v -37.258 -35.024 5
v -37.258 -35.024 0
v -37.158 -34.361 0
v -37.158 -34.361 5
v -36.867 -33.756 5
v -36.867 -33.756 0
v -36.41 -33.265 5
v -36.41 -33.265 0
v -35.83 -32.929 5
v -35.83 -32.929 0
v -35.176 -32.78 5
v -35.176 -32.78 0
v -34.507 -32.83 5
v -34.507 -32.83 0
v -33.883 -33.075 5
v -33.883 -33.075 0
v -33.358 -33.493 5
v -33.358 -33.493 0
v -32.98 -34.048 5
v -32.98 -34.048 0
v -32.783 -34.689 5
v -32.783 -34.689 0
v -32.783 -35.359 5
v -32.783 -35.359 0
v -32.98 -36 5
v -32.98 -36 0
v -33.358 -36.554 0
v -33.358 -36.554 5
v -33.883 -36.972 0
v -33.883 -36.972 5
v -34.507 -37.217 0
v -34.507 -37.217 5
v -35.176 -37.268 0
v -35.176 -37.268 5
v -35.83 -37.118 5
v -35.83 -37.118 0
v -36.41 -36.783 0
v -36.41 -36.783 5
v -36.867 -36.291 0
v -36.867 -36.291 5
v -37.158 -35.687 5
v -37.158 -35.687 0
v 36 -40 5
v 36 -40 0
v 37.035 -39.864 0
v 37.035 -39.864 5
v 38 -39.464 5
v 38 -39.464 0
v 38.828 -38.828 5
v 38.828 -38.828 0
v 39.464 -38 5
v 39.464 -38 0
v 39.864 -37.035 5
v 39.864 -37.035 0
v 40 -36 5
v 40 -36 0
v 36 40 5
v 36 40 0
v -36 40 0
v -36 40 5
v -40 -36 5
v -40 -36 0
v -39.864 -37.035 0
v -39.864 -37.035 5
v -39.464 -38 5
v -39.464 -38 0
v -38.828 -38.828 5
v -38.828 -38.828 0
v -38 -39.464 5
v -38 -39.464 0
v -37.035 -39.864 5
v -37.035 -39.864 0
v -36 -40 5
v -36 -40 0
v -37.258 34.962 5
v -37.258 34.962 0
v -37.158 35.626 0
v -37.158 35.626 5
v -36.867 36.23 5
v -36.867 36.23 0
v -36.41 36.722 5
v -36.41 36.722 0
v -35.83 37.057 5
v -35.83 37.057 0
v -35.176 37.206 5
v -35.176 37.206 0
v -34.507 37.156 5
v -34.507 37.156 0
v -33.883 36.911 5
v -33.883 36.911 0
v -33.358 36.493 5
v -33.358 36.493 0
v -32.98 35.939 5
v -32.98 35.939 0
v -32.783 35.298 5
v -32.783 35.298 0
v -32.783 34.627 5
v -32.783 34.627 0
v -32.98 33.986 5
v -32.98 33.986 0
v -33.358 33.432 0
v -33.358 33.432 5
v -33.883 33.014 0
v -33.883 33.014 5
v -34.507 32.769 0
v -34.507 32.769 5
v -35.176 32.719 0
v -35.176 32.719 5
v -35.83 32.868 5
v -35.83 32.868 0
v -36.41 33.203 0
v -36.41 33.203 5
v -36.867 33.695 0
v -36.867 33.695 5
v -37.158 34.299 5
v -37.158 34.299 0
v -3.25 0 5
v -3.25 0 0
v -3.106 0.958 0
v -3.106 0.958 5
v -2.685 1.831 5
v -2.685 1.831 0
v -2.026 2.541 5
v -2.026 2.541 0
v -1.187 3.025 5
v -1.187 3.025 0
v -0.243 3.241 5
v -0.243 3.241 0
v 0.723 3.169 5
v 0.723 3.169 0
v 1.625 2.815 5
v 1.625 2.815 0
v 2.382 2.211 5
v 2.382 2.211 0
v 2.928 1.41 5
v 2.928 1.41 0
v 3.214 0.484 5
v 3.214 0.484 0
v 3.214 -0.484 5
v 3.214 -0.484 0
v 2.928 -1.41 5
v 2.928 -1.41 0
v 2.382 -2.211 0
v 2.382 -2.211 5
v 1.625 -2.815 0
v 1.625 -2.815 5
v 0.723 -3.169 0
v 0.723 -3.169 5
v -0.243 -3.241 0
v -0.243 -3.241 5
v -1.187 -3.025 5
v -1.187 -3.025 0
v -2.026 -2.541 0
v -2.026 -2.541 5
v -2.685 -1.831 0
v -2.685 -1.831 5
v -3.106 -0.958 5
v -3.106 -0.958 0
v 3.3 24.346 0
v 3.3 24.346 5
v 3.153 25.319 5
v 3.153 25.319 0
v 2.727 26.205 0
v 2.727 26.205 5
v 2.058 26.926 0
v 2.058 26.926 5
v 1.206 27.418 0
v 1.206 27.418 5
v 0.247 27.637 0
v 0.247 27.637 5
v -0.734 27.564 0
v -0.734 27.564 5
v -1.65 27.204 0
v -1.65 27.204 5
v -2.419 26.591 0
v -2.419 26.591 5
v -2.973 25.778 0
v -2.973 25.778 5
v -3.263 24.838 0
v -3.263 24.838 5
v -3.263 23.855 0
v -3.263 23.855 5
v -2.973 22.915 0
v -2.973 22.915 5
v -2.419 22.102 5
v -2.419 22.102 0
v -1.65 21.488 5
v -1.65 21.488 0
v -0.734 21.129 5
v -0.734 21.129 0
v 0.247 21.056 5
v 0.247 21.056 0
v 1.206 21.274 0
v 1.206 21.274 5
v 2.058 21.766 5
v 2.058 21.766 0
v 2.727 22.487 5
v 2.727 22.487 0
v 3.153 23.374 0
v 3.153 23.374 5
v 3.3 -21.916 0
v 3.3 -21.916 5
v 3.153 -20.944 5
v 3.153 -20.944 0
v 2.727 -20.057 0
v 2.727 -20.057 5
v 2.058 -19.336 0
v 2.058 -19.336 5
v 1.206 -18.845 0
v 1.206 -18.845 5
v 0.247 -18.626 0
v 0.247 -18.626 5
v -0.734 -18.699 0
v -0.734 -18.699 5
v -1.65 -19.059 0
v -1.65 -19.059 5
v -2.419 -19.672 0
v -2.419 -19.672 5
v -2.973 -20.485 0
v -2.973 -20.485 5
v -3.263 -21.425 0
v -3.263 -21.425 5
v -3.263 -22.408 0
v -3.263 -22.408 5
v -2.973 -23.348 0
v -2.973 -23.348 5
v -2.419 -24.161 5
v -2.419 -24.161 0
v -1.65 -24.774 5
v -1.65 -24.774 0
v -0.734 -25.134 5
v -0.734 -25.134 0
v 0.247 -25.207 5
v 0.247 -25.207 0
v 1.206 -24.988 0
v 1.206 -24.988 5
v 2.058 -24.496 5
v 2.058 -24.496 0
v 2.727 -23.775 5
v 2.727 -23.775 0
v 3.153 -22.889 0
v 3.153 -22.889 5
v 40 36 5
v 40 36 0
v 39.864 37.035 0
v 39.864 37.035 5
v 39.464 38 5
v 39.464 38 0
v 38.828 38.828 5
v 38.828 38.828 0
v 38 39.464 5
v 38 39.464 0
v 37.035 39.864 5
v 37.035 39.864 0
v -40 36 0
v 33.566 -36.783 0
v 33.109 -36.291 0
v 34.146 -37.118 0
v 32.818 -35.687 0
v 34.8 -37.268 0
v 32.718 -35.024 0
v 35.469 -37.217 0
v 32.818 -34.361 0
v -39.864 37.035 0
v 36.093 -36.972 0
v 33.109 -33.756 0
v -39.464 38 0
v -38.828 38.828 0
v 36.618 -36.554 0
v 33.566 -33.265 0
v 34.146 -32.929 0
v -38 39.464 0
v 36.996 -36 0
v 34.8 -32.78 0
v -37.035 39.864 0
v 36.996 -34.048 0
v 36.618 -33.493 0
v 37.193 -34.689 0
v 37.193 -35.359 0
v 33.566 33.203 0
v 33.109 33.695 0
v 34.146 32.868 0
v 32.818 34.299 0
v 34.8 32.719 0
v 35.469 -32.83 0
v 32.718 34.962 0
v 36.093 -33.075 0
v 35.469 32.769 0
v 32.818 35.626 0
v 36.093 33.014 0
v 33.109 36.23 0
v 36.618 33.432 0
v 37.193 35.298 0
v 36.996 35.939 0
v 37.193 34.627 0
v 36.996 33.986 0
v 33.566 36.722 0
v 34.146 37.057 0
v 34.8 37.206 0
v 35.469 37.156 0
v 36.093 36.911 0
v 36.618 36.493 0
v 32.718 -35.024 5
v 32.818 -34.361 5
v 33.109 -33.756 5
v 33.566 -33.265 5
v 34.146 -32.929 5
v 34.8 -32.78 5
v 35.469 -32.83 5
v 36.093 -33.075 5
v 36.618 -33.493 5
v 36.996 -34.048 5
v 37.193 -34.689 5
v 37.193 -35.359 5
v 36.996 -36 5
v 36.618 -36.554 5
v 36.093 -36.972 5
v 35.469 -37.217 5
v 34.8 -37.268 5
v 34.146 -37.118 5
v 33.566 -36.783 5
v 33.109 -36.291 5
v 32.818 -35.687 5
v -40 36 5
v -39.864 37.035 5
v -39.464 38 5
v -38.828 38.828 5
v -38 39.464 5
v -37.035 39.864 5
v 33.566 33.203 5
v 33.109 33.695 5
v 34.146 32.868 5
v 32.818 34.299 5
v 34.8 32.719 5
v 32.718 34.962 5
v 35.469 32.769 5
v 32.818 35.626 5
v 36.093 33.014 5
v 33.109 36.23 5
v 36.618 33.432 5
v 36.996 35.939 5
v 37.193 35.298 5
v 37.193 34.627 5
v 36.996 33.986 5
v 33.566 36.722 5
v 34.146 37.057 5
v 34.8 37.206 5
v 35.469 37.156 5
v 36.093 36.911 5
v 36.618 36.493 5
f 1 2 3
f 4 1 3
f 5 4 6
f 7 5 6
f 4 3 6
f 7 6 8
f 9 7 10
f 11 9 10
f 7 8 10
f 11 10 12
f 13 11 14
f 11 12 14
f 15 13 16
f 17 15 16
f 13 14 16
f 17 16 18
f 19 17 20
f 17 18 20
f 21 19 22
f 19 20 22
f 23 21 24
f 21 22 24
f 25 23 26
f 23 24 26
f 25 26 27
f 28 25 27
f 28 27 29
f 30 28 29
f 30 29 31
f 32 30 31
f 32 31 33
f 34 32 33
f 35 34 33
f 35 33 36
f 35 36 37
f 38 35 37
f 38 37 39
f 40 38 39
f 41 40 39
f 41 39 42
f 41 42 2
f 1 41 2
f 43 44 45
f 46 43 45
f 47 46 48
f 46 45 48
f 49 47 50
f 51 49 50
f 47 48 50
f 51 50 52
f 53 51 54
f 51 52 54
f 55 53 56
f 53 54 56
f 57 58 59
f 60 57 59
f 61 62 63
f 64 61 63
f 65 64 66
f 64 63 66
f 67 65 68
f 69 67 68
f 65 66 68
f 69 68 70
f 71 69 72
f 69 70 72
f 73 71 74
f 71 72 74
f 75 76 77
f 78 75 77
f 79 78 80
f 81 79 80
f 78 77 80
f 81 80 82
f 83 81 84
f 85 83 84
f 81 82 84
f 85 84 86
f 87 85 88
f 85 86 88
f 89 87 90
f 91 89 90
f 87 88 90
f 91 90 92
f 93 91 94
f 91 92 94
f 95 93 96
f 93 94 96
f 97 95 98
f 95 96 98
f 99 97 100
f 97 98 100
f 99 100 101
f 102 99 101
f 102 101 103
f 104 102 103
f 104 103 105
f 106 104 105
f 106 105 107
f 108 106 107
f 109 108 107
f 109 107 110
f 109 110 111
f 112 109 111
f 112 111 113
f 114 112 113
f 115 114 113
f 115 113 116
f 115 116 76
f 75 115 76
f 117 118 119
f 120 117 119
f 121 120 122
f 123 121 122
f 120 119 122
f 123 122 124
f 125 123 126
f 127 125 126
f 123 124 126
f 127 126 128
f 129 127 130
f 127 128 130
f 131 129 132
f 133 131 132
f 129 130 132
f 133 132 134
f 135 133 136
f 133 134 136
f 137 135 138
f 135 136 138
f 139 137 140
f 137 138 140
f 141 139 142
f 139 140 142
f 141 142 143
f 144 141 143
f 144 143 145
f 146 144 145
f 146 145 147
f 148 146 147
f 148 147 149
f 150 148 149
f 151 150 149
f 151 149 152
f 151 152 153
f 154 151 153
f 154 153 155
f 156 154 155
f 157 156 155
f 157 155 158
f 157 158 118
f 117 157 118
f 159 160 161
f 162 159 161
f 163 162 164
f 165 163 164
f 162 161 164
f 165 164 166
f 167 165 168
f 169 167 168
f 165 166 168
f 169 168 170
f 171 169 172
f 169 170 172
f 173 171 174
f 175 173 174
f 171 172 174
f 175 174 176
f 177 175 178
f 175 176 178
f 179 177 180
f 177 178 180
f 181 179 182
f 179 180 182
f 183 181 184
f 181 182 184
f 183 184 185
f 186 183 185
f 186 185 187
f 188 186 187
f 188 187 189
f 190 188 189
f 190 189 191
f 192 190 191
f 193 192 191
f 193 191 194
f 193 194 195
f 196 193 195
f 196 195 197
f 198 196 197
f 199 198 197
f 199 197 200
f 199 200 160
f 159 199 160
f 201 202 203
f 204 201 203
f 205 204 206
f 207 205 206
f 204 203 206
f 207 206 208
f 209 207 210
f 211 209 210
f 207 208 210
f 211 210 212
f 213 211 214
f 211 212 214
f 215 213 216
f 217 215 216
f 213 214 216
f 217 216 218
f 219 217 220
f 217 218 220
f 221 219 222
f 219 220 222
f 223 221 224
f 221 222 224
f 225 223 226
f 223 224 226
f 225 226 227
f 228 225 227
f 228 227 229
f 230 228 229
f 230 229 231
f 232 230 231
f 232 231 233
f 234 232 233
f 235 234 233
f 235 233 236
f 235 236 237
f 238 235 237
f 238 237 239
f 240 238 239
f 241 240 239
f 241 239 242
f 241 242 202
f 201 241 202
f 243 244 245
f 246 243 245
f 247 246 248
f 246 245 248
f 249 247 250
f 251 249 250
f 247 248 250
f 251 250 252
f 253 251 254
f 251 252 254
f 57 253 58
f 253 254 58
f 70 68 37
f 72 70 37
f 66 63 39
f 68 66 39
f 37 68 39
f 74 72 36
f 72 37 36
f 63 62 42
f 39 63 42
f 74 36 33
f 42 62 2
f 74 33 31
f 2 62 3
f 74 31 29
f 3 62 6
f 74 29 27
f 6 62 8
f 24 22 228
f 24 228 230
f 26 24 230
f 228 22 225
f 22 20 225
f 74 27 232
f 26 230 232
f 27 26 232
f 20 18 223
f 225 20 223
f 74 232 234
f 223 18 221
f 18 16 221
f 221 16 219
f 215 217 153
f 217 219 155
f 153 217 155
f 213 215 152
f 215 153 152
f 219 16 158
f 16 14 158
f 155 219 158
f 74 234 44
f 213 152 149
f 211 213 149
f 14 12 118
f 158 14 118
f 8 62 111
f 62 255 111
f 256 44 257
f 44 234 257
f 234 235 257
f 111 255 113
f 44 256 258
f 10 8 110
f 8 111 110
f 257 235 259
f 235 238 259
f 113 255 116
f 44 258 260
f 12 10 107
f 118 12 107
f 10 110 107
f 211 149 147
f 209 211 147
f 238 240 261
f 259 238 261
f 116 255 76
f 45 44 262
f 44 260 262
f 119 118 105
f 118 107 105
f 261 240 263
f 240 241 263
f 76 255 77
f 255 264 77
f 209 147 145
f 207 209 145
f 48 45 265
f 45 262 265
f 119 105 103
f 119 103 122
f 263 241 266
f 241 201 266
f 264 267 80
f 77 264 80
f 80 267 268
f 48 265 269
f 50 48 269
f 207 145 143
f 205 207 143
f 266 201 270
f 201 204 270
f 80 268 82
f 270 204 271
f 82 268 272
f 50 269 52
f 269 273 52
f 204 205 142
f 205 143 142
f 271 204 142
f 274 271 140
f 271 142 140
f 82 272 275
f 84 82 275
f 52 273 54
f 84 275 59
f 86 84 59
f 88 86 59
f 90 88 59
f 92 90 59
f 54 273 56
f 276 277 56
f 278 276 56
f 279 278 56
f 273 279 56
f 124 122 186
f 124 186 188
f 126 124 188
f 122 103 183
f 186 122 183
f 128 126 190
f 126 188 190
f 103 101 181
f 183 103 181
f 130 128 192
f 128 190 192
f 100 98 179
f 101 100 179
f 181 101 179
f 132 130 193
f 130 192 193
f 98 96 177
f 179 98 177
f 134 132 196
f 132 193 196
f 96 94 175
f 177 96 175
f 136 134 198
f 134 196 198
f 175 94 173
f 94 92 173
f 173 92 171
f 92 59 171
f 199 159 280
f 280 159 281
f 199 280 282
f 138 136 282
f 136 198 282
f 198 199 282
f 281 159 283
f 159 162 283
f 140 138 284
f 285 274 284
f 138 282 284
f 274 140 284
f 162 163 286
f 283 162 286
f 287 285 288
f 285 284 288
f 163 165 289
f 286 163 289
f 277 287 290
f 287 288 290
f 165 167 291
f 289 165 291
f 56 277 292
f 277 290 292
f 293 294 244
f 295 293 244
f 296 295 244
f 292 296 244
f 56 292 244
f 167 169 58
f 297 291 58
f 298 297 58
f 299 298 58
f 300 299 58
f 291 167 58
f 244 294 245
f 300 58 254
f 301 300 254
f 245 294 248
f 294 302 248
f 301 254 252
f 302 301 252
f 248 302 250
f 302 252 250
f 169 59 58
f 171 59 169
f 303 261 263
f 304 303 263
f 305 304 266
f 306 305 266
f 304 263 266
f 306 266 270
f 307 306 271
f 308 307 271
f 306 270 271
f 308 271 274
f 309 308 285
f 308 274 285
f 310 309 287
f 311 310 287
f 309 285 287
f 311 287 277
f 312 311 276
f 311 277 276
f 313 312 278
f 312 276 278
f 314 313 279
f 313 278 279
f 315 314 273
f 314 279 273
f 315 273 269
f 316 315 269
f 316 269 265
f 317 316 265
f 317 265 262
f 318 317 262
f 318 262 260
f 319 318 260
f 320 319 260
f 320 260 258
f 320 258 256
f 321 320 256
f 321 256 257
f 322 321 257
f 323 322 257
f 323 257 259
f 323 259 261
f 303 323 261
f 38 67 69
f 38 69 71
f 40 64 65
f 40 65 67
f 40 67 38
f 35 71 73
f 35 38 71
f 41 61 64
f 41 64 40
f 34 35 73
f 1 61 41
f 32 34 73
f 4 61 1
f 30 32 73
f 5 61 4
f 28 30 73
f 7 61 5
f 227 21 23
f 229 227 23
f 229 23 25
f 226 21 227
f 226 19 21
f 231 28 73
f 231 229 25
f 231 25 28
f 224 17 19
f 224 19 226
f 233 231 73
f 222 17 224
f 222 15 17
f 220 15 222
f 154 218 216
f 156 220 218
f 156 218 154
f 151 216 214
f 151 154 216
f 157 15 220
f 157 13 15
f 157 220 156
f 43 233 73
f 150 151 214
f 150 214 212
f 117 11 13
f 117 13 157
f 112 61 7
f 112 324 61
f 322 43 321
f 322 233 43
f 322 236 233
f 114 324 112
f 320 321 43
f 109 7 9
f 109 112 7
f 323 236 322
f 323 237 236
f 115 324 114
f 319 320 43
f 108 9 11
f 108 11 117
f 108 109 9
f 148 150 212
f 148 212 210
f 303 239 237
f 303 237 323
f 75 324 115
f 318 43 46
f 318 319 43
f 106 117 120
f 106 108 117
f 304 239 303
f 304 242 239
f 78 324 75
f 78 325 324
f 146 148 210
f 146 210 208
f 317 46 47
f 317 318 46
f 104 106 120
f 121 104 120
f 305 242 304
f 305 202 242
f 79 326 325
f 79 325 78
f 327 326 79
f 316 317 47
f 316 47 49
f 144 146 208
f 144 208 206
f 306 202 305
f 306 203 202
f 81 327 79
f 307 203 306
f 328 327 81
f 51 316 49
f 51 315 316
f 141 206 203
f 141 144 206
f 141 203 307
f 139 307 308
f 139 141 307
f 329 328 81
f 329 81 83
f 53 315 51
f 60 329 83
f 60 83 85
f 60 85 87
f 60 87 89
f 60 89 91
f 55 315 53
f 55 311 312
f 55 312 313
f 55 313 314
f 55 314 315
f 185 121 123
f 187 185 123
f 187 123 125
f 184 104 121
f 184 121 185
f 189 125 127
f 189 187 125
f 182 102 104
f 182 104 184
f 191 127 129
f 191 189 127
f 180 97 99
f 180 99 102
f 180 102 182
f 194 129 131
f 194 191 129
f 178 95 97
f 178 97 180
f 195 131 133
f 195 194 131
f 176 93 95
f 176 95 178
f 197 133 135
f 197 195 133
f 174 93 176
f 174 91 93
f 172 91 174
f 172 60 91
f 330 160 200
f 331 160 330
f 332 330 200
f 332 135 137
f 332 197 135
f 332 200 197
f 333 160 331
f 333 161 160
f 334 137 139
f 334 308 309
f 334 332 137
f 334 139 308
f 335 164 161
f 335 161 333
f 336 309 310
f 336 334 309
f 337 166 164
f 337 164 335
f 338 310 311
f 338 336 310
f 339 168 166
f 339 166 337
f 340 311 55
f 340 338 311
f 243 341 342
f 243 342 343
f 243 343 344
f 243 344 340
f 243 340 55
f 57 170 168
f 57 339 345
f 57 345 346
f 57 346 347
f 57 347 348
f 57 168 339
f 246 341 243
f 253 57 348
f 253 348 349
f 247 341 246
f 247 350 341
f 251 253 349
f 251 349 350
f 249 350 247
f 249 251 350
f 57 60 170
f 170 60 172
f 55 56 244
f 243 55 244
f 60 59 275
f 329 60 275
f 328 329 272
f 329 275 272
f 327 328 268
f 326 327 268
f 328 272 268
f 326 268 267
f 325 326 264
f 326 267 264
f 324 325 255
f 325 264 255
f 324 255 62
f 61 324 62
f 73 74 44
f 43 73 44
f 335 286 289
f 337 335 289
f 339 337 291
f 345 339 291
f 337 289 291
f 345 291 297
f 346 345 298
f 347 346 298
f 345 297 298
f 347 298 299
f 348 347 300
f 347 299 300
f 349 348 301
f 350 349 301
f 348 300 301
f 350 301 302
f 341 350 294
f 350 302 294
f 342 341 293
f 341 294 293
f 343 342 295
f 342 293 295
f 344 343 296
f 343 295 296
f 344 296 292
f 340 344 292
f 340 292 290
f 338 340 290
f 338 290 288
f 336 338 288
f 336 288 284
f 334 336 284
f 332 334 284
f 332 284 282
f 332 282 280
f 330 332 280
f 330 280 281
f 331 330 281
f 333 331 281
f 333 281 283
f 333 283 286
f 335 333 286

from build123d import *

# Parameters (mm, degrees)
BOSS_EXTRU_1_DEPTH      = 5
D_GAGEMENT_M41_D        = 4.5
ESQUISSE4_R             = 3.25
ENL_V_MAT_EXTRU_1_DEPTH = 57.789083458
D_GAGEMENT_M61_D        = 6.6


with BuildPart() as part:
    # Esquisse1 → Boss.-Extru.1 (new body)
    with BuildSketch(Plane.XY):
        with BuildLine():
            Line((-36, -40), (36, -40))
            ThreePointArc((36, -40), (38.828427125, -38.828427125), (40, -36))
            Line((40, -36), (40, 36))
            ThreePointArc((40, 36), (38.828427125, 38.828427125), (36, 40))
            Line((36, 40), (-36, 40))
            ThreePointArc((-36, 40), (-38.828427125, 38.828427125), (-40, 36))
            Line((-40, 36), (-40, -36))
            ThreePointArc((-40, -36), (-38.828427125, -38.828427125), (-36, -40))
        make_face()
    extrude(amount=BOSS_EXTRU_1_DEPTH)

    # Dégagement M41 (through all)
    with Locations(Plane.XY.offset(5)):
        with Locations((-35.007622699, 34.962380164), (34.968353645, 34.962380164), (34.968353645, -35.023881333), (-35.007622699, -35.023881333)):
            Hole(D_GAGEMENT_M41_D / 2)

    # Esquisse4 → Enlèv. mat.-Extru.1 (cut, through all)
    with BuildSketch(Plane(origin=(0, 0, 0), x_dir=(-1, 0, 0), z_dir=(0, 0, -1))):
        Circle(ESQUISSE4_R)
    extrude(amount=-ENL_V_MAT_EXTRU_1_DEPTH, mode=Mode.SUBTRACT)

    # Dégagement M61 (through all)
    with Locations(Plane(origin=(0, 0, 0), x_dir=(-1, 0, 0), z_dir=(0, 0, -1))):
        with Locations((0, -21.916448078), (0, 24.346376155)):
            Hole(D_GAGEMENT_M61_D / 2)


solid = part.part
